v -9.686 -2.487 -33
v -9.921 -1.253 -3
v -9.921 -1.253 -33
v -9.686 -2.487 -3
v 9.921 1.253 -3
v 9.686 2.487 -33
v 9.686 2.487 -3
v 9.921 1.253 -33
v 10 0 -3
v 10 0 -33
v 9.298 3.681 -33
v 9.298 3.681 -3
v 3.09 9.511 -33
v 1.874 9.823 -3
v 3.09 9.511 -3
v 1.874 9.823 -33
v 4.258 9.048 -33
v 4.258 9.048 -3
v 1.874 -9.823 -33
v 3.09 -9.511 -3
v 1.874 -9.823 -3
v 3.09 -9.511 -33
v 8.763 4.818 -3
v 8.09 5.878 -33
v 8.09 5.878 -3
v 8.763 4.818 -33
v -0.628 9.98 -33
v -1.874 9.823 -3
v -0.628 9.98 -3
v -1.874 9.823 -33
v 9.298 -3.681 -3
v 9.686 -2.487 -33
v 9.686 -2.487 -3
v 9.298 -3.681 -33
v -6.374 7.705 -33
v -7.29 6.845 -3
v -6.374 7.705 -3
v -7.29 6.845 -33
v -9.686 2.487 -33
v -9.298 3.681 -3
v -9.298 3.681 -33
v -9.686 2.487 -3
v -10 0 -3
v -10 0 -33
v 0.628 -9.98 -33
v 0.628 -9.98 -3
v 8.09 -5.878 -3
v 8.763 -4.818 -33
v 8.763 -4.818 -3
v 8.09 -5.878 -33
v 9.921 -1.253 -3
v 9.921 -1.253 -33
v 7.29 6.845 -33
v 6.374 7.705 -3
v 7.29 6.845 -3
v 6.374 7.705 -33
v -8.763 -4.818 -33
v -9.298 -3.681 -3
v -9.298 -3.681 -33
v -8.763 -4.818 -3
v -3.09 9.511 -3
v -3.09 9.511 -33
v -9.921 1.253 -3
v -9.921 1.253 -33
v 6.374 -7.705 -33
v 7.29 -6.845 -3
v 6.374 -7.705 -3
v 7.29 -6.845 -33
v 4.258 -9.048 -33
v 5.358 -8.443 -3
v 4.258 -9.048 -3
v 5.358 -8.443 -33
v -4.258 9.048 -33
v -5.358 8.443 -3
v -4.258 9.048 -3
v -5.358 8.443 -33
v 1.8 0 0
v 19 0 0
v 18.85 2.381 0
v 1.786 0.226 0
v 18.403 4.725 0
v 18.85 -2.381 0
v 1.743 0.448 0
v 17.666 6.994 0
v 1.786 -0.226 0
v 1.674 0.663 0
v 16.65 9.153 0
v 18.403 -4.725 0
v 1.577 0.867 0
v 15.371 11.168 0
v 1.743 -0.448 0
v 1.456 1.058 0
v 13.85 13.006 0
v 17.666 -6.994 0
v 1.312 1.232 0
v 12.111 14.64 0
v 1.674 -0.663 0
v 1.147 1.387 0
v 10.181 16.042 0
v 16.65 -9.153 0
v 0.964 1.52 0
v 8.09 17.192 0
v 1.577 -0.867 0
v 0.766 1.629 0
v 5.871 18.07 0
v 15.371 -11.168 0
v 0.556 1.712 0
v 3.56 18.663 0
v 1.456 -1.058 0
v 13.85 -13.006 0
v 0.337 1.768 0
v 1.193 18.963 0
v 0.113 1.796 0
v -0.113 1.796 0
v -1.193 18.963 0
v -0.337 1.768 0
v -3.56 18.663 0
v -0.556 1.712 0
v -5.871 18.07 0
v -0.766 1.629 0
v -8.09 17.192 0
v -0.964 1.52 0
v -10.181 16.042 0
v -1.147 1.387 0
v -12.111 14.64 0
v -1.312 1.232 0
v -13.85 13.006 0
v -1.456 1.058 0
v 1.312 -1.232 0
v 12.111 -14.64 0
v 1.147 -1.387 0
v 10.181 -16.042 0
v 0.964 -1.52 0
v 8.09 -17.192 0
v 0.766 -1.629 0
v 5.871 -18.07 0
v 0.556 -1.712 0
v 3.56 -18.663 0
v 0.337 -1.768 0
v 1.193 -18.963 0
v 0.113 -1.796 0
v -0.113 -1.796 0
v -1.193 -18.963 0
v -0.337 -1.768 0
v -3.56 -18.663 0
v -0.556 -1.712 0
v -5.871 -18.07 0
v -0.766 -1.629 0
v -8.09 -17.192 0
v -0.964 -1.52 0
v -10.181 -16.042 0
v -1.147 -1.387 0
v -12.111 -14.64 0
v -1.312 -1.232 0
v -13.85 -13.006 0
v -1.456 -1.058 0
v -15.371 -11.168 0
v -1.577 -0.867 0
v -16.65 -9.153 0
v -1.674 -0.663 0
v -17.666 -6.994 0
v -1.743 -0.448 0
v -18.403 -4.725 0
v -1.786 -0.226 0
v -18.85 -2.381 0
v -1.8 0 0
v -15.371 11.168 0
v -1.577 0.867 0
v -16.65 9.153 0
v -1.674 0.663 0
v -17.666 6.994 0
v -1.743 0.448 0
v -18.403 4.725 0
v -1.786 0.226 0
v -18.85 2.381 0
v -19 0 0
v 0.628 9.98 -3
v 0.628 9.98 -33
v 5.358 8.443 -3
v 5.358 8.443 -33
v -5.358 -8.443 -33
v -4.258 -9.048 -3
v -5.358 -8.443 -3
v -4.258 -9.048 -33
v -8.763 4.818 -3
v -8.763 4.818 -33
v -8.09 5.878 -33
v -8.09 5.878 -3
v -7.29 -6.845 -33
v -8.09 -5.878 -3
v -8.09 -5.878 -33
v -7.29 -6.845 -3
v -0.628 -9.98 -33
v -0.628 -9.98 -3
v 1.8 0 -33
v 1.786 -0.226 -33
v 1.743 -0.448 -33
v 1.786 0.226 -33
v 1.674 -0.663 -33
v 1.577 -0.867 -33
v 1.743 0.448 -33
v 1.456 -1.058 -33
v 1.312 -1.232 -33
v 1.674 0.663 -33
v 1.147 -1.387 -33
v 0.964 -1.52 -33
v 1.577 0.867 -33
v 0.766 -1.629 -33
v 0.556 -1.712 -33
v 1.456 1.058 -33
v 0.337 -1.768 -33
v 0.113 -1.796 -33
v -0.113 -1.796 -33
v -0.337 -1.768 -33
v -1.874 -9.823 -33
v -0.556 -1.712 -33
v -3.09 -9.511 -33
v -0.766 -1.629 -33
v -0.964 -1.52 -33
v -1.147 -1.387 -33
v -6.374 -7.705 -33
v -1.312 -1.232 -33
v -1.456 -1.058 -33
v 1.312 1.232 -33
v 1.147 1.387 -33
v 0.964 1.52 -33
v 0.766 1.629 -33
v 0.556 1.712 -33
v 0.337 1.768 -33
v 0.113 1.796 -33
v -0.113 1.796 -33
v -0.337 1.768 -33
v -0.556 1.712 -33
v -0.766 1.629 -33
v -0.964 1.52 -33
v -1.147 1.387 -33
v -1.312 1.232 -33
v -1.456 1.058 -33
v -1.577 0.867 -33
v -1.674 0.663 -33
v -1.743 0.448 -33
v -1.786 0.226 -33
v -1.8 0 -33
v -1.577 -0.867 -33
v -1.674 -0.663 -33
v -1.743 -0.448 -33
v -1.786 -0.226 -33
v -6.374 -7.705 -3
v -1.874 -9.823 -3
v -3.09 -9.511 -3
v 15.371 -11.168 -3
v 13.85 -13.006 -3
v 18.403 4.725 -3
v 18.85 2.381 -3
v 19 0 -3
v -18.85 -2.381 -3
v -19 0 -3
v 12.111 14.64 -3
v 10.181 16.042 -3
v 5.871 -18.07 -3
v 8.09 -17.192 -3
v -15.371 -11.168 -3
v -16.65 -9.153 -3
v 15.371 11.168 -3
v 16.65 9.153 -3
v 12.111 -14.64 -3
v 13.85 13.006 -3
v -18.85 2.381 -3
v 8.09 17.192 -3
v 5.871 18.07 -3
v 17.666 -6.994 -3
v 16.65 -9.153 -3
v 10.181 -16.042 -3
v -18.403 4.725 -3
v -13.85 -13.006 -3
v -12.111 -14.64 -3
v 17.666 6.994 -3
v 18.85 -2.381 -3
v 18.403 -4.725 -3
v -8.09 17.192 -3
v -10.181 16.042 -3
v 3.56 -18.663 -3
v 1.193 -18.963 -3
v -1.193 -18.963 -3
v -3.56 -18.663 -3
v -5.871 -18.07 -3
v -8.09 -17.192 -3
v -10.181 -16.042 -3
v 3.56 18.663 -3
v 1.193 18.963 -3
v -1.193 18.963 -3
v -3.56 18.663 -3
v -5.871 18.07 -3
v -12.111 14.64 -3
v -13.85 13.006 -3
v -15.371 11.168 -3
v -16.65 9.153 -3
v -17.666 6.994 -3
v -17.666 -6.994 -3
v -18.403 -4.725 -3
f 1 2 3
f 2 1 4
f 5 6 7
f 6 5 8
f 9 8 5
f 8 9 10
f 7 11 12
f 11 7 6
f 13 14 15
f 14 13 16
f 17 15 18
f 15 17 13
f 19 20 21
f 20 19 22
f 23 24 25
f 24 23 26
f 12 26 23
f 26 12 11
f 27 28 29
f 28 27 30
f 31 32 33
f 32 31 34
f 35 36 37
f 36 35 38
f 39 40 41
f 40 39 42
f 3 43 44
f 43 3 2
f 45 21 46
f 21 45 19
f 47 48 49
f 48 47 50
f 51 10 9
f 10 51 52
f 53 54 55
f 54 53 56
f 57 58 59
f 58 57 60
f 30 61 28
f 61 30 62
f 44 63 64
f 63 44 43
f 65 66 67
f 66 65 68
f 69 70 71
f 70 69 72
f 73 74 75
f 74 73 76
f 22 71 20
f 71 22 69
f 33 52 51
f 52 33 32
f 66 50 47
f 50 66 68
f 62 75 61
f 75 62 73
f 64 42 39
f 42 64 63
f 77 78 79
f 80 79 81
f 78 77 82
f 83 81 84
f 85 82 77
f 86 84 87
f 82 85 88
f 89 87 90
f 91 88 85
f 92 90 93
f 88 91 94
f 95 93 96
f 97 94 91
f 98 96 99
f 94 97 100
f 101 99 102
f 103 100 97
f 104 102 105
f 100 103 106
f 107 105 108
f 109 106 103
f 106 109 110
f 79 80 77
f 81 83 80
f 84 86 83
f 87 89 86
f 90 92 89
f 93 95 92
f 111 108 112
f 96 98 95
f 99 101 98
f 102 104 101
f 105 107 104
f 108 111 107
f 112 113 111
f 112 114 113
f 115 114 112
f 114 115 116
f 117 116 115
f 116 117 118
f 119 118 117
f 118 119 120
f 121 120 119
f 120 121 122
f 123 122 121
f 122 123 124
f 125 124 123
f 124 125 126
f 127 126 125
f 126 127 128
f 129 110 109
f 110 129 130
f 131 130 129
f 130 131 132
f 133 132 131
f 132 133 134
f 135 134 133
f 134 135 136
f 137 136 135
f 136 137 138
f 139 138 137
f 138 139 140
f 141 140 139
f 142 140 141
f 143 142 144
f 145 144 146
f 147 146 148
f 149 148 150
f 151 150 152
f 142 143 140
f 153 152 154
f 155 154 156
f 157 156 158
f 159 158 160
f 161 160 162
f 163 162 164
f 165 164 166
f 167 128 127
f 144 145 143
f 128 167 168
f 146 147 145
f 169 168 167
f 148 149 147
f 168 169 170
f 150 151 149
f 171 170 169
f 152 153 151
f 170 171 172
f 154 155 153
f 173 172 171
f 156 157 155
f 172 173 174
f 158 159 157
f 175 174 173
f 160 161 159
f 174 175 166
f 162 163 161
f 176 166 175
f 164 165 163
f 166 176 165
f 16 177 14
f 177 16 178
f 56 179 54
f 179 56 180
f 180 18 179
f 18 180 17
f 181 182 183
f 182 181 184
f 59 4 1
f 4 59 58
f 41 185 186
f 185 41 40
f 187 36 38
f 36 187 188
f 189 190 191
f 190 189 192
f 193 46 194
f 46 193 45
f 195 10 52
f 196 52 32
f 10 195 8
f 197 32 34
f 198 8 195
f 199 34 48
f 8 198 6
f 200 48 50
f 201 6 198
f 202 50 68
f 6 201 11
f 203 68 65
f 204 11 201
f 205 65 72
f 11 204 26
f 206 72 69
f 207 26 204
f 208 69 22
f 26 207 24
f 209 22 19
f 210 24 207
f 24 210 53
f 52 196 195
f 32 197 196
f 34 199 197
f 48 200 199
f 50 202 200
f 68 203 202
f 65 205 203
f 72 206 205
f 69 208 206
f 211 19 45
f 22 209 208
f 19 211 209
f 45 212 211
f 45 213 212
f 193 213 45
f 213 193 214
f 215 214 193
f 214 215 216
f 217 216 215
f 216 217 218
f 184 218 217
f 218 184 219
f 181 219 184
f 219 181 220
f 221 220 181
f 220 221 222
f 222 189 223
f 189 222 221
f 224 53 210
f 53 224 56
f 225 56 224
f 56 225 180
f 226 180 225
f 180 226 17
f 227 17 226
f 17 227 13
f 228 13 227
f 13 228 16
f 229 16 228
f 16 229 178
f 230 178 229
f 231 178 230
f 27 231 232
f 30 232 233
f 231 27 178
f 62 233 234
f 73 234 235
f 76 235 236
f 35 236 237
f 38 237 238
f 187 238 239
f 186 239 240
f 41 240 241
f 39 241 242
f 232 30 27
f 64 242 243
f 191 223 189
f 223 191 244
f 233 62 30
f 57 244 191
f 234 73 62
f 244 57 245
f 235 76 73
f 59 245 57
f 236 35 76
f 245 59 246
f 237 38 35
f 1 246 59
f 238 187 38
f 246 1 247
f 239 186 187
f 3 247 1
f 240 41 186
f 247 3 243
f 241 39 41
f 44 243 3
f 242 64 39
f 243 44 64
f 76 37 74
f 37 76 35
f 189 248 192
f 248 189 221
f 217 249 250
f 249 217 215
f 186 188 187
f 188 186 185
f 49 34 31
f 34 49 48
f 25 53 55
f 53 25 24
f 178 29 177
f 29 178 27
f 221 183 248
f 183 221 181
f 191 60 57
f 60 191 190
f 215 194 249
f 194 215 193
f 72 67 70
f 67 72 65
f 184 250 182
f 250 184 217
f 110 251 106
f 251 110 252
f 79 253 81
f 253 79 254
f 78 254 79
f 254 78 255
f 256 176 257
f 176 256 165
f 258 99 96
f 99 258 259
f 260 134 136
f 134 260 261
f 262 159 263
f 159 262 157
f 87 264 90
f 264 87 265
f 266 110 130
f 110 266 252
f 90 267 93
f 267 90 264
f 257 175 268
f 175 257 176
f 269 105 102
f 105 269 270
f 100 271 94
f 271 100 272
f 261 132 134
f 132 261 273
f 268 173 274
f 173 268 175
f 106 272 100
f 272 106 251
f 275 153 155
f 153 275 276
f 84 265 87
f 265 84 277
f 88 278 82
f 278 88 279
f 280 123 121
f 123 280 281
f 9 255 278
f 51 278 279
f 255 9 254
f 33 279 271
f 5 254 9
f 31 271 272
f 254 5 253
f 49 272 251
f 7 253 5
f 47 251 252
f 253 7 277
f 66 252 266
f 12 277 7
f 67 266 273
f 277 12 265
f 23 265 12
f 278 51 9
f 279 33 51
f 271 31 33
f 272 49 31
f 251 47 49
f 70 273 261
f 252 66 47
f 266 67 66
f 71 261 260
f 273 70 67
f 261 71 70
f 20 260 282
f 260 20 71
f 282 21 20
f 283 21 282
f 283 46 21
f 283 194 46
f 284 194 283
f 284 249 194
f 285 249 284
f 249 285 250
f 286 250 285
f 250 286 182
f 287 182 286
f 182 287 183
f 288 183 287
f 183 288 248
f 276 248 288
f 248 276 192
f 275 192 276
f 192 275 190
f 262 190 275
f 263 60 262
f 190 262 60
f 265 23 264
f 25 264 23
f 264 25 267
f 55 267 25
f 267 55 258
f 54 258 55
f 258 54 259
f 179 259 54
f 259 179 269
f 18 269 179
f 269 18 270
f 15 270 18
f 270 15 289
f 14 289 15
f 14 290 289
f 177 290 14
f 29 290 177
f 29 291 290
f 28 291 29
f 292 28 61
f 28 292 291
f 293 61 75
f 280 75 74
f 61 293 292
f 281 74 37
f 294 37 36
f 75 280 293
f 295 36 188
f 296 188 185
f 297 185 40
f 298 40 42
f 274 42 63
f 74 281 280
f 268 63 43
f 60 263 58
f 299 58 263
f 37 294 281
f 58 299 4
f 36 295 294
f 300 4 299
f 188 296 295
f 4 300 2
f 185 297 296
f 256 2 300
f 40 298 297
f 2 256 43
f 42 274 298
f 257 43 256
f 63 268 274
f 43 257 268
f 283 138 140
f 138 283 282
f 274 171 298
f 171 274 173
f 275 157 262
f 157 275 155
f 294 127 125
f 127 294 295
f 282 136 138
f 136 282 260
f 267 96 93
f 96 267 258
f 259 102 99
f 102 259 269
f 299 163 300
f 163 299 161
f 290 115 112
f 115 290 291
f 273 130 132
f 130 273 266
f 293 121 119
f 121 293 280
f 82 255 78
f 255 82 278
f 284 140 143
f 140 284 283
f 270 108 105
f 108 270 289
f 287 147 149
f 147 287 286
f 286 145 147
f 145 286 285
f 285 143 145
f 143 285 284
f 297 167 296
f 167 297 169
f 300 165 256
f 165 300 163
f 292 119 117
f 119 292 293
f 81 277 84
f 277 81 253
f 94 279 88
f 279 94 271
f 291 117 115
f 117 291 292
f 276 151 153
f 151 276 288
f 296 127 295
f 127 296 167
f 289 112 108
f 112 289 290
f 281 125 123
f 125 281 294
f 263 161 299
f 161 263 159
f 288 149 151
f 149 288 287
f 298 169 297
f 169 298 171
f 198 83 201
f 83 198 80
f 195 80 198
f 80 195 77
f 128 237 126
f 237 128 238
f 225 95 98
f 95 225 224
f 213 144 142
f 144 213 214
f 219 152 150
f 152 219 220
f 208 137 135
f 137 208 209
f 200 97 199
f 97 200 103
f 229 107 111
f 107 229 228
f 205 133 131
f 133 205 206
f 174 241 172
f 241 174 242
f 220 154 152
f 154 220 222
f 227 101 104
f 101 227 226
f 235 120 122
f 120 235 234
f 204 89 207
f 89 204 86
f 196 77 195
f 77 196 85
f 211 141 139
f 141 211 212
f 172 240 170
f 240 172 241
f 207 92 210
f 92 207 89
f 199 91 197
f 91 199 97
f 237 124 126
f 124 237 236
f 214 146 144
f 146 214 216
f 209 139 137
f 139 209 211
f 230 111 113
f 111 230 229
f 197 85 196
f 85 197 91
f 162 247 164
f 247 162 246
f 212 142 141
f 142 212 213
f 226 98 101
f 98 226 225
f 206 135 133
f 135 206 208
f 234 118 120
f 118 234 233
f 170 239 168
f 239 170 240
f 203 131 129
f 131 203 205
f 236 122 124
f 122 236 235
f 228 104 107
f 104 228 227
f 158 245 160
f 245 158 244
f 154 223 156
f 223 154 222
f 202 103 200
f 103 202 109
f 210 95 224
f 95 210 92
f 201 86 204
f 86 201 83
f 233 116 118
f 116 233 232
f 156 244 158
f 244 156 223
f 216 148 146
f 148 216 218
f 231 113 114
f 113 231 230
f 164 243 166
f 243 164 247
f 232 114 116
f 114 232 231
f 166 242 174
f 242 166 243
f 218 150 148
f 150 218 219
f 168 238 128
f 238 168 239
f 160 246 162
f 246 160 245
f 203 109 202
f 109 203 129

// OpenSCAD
$fn = 50;


difference() {
	union() {
		translate(v = [0, 0, -33.0000000000]) {
			cylinder(h = 33, r = 10.0000000000);
		}
		translate(v = [0, 0, -3.0000000000]) {
			cylinder(h = 3, r = 19.0000000000);
		}
	}
	union() {
		#translate(v = [0, 0, -33]) {
			cylinder(h = 33, r = 1.8000000000);
		}
	}
}
